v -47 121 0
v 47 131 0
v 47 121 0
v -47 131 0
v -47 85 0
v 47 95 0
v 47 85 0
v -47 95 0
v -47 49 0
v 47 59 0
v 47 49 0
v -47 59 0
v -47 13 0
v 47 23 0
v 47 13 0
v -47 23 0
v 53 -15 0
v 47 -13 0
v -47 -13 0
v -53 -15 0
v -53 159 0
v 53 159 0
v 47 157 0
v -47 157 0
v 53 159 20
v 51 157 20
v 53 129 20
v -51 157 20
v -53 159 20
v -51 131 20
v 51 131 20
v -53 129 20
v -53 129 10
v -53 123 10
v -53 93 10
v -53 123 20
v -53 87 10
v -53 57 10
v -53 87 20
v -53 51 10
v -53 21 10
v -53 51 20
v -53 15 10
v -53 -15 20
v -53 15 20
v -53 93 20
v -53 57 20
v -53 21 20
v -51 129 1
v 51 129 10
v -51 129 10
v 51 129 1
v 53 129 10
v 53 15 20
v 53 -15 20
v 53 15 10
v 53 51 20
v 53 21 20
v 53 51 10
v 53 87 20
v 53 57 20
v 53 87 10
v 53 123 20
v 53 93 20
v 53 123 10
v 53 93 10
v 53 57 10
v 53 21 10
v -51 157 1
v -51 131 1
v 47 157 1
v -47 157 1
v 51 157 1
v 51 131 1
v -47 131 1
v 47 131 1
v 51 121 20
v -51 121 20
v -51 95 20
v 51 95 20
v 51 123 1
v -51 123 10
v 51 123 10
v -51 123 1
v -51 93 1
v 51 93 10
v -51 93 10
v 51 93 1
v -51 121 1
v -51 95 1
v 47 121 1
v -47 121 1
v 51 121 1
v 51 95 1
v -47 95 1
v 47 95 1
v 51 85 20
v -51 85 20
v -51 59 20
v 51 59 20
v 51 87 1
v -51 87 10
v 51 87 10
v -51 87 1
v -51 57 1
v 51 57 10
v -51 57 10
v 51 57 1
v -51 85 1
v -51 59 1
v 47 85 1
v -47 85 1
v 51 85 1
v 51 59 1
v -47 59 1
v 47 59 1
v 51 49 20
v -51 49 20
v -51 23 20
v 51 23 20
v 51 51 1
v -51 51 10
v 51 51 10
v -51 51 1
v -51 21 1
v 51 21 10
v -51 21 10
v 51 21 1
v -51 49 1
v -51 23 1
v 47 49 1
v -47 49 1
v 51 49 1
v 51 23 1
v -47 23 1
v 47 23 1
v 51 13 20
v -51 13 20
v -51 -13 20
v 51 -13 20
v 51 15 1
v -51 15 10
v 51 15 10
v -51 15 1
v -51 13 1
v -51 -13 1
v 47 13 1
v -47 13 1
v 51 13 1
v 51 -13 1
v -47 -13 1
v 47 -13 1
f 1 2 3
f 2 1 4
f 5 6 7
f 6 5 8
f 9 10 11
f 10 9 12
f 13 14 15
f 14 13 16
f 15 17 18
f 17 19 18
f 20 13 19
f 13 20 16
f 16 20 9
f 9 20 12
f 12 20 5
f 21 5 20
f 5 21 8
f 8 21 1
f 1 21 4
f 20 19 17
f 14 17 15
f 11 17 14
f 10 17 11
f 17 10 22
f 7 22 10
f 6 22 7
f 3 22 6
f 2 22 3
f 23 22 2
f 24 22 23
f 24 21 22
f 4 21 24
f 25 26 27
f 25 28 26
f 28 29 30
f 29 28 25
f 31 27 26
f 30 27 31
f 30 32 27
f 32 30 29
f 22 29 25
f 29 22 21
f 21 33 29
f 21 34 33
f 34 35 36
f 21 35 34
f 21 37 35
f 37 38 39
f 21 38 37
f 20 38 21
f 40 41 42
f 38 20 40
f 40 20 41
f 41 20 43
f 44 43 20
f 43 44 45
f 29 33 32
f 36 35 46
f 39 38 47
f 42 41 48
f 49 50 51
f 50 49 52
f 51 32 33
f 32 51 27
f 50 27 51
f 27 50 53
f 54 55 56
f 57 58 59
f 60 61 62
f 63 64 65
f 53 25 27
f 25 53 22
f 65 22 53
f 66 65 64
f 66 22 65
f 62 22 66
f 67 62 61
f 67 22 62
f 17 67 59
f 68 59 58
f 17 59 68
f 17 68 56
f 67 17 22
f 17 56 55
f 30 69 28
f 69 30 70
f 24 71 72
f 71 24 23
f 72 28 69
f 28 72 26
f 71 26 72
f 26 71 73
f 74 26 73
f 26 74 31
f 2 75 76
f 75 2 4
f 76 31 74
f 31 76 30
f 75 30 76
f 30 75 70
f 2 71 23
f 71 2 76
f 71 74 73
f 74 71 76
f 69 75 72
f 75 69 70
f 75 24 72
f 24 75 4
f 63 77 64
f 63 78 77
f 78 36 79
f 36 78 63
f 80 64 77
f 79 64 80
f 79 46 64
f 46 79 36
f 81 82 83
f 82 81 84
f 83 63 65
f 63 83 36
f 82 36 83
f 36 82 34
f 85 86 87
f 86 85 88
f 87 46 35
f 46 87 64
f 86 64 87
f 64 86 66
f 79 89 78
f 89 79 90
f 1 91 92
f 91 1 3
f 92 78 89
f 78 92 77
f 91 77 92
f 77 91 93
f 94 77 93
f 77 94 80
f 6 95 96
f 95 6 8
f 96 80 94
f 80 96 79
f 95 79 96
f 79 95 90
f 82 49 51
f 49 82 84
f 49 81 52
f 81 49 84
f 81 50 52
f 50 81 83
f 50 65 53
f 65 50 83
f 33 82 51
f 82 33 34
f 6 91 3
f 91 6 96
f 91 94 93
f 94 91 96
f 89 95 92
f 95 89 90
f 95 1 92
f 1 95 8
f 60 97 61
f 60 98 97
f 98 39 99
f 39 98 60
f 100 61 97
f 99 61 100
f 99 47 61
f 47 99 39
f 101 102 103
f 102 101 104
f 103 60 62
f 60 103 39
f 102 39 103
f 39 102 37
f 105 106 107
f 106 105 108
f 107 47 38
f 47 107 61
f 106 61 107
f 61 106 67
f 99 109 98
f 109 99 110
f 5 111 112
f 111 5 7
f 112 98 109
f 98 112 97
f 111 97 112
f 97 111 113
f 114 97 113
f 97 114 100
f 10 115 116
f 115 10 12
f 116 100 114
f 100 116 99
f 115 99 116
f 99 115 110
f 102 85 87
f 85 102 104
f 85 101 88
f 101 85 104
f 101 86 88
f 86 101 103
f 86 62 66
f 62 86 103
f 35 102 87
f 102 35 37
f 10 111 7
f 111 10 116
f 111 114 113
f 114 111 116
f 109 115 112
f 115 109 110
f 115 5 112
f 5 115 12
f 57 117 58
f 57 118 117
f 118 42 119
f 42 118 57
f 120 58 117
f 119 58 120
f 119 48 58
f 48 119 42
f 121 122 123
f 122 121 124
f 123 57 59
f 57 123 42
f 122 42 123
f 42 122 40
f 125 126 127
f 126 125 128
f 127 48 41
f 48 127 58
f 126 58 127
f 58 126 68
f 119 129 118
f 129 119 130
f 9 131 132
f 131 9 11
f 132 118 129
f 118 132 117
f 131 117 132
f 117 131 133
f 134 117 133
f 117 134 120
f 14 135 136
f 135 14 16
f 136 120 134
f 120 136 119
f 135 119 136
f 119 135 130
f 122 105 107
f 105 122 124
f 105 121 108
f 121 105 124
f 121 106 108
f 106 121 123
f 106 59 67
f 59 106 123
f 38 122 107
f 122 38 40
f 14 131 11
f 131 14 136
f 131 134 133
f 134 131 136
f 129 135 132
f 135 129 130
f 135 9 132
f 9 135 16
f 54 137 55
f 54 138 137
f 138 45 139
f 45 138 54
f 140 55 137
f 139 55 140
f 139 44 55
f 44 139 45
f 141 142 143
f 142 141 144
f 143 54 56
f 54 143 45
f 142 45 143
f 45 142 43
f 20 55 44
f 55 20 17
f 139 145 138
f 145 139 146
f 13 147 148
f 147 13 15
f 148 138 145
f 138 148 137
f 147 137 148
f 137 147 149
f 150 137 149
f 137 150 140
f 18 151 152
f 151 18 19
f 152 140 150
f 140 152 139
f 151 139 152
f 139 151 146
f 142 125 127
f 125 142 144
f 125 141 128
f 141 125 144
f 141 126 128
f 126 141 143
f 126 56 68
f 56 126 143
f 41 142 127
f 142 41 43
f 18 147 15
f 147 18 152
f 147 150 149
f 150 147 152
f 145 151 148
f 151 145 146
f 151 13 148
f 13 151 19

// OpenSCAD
//hard drive dimensions
hddx=102;
hddy=26;

wall_thickness=2;
height=20; //height of walls

number_of_drives = 5;
gap = 10; //gap between drives
gap_brace_height = 10; //height of walls either side of the gaps
endcap=1; //put supports on to stop the drive falling through



hddBay(number_of_drives-1); //do the thing



//the thing:
module hddBay(number)
{
    linear_extrude(height)
    difference()
    {
        //box wot drive fits into
        square([hddx+wall_thickness*2,hddy+wall_thickness*2],center=true);
        square([hddx,hddy],center=true);
        
    }
    
    //flats between the drives
    if(number) translate([0,gap/2+(hddy/2),0]) linear_extrude(1)
        square([hddx,gap-wall_thickness*2],center=true);
    //walls either side of the gaps
    if(number) translate([hddx/2+wall_thickness/2,gap/2+(hddy/2),0]) linear_extrude(gap_brace_height)
        square([wall_thickness,gap-wall_thickness*2],center=true);
    // ^
    if(number) translate([-hddx/2-wall_thickness/2,gap/2+(hddy/2),0]) linear_extrude(gap_brace_height)
        square([wall_thickness,gap-wall_thickness*2],center=true);
    
    //end cap bits to stop the drives falling through
    if(endcap) translate([hddx/2-2,0,0]) linear_extrude(1) square([4,hddy],center=true);
    if(endcap) translate([-hddx/2+2,0,0]) linear_extrude(1) square([4,hddy],center=true);
    
    //because if this wasn't confusing enough, here's some recursion!    
    if(number) translate([0,hddy+gap,0])hddBay(number-1); 
}
